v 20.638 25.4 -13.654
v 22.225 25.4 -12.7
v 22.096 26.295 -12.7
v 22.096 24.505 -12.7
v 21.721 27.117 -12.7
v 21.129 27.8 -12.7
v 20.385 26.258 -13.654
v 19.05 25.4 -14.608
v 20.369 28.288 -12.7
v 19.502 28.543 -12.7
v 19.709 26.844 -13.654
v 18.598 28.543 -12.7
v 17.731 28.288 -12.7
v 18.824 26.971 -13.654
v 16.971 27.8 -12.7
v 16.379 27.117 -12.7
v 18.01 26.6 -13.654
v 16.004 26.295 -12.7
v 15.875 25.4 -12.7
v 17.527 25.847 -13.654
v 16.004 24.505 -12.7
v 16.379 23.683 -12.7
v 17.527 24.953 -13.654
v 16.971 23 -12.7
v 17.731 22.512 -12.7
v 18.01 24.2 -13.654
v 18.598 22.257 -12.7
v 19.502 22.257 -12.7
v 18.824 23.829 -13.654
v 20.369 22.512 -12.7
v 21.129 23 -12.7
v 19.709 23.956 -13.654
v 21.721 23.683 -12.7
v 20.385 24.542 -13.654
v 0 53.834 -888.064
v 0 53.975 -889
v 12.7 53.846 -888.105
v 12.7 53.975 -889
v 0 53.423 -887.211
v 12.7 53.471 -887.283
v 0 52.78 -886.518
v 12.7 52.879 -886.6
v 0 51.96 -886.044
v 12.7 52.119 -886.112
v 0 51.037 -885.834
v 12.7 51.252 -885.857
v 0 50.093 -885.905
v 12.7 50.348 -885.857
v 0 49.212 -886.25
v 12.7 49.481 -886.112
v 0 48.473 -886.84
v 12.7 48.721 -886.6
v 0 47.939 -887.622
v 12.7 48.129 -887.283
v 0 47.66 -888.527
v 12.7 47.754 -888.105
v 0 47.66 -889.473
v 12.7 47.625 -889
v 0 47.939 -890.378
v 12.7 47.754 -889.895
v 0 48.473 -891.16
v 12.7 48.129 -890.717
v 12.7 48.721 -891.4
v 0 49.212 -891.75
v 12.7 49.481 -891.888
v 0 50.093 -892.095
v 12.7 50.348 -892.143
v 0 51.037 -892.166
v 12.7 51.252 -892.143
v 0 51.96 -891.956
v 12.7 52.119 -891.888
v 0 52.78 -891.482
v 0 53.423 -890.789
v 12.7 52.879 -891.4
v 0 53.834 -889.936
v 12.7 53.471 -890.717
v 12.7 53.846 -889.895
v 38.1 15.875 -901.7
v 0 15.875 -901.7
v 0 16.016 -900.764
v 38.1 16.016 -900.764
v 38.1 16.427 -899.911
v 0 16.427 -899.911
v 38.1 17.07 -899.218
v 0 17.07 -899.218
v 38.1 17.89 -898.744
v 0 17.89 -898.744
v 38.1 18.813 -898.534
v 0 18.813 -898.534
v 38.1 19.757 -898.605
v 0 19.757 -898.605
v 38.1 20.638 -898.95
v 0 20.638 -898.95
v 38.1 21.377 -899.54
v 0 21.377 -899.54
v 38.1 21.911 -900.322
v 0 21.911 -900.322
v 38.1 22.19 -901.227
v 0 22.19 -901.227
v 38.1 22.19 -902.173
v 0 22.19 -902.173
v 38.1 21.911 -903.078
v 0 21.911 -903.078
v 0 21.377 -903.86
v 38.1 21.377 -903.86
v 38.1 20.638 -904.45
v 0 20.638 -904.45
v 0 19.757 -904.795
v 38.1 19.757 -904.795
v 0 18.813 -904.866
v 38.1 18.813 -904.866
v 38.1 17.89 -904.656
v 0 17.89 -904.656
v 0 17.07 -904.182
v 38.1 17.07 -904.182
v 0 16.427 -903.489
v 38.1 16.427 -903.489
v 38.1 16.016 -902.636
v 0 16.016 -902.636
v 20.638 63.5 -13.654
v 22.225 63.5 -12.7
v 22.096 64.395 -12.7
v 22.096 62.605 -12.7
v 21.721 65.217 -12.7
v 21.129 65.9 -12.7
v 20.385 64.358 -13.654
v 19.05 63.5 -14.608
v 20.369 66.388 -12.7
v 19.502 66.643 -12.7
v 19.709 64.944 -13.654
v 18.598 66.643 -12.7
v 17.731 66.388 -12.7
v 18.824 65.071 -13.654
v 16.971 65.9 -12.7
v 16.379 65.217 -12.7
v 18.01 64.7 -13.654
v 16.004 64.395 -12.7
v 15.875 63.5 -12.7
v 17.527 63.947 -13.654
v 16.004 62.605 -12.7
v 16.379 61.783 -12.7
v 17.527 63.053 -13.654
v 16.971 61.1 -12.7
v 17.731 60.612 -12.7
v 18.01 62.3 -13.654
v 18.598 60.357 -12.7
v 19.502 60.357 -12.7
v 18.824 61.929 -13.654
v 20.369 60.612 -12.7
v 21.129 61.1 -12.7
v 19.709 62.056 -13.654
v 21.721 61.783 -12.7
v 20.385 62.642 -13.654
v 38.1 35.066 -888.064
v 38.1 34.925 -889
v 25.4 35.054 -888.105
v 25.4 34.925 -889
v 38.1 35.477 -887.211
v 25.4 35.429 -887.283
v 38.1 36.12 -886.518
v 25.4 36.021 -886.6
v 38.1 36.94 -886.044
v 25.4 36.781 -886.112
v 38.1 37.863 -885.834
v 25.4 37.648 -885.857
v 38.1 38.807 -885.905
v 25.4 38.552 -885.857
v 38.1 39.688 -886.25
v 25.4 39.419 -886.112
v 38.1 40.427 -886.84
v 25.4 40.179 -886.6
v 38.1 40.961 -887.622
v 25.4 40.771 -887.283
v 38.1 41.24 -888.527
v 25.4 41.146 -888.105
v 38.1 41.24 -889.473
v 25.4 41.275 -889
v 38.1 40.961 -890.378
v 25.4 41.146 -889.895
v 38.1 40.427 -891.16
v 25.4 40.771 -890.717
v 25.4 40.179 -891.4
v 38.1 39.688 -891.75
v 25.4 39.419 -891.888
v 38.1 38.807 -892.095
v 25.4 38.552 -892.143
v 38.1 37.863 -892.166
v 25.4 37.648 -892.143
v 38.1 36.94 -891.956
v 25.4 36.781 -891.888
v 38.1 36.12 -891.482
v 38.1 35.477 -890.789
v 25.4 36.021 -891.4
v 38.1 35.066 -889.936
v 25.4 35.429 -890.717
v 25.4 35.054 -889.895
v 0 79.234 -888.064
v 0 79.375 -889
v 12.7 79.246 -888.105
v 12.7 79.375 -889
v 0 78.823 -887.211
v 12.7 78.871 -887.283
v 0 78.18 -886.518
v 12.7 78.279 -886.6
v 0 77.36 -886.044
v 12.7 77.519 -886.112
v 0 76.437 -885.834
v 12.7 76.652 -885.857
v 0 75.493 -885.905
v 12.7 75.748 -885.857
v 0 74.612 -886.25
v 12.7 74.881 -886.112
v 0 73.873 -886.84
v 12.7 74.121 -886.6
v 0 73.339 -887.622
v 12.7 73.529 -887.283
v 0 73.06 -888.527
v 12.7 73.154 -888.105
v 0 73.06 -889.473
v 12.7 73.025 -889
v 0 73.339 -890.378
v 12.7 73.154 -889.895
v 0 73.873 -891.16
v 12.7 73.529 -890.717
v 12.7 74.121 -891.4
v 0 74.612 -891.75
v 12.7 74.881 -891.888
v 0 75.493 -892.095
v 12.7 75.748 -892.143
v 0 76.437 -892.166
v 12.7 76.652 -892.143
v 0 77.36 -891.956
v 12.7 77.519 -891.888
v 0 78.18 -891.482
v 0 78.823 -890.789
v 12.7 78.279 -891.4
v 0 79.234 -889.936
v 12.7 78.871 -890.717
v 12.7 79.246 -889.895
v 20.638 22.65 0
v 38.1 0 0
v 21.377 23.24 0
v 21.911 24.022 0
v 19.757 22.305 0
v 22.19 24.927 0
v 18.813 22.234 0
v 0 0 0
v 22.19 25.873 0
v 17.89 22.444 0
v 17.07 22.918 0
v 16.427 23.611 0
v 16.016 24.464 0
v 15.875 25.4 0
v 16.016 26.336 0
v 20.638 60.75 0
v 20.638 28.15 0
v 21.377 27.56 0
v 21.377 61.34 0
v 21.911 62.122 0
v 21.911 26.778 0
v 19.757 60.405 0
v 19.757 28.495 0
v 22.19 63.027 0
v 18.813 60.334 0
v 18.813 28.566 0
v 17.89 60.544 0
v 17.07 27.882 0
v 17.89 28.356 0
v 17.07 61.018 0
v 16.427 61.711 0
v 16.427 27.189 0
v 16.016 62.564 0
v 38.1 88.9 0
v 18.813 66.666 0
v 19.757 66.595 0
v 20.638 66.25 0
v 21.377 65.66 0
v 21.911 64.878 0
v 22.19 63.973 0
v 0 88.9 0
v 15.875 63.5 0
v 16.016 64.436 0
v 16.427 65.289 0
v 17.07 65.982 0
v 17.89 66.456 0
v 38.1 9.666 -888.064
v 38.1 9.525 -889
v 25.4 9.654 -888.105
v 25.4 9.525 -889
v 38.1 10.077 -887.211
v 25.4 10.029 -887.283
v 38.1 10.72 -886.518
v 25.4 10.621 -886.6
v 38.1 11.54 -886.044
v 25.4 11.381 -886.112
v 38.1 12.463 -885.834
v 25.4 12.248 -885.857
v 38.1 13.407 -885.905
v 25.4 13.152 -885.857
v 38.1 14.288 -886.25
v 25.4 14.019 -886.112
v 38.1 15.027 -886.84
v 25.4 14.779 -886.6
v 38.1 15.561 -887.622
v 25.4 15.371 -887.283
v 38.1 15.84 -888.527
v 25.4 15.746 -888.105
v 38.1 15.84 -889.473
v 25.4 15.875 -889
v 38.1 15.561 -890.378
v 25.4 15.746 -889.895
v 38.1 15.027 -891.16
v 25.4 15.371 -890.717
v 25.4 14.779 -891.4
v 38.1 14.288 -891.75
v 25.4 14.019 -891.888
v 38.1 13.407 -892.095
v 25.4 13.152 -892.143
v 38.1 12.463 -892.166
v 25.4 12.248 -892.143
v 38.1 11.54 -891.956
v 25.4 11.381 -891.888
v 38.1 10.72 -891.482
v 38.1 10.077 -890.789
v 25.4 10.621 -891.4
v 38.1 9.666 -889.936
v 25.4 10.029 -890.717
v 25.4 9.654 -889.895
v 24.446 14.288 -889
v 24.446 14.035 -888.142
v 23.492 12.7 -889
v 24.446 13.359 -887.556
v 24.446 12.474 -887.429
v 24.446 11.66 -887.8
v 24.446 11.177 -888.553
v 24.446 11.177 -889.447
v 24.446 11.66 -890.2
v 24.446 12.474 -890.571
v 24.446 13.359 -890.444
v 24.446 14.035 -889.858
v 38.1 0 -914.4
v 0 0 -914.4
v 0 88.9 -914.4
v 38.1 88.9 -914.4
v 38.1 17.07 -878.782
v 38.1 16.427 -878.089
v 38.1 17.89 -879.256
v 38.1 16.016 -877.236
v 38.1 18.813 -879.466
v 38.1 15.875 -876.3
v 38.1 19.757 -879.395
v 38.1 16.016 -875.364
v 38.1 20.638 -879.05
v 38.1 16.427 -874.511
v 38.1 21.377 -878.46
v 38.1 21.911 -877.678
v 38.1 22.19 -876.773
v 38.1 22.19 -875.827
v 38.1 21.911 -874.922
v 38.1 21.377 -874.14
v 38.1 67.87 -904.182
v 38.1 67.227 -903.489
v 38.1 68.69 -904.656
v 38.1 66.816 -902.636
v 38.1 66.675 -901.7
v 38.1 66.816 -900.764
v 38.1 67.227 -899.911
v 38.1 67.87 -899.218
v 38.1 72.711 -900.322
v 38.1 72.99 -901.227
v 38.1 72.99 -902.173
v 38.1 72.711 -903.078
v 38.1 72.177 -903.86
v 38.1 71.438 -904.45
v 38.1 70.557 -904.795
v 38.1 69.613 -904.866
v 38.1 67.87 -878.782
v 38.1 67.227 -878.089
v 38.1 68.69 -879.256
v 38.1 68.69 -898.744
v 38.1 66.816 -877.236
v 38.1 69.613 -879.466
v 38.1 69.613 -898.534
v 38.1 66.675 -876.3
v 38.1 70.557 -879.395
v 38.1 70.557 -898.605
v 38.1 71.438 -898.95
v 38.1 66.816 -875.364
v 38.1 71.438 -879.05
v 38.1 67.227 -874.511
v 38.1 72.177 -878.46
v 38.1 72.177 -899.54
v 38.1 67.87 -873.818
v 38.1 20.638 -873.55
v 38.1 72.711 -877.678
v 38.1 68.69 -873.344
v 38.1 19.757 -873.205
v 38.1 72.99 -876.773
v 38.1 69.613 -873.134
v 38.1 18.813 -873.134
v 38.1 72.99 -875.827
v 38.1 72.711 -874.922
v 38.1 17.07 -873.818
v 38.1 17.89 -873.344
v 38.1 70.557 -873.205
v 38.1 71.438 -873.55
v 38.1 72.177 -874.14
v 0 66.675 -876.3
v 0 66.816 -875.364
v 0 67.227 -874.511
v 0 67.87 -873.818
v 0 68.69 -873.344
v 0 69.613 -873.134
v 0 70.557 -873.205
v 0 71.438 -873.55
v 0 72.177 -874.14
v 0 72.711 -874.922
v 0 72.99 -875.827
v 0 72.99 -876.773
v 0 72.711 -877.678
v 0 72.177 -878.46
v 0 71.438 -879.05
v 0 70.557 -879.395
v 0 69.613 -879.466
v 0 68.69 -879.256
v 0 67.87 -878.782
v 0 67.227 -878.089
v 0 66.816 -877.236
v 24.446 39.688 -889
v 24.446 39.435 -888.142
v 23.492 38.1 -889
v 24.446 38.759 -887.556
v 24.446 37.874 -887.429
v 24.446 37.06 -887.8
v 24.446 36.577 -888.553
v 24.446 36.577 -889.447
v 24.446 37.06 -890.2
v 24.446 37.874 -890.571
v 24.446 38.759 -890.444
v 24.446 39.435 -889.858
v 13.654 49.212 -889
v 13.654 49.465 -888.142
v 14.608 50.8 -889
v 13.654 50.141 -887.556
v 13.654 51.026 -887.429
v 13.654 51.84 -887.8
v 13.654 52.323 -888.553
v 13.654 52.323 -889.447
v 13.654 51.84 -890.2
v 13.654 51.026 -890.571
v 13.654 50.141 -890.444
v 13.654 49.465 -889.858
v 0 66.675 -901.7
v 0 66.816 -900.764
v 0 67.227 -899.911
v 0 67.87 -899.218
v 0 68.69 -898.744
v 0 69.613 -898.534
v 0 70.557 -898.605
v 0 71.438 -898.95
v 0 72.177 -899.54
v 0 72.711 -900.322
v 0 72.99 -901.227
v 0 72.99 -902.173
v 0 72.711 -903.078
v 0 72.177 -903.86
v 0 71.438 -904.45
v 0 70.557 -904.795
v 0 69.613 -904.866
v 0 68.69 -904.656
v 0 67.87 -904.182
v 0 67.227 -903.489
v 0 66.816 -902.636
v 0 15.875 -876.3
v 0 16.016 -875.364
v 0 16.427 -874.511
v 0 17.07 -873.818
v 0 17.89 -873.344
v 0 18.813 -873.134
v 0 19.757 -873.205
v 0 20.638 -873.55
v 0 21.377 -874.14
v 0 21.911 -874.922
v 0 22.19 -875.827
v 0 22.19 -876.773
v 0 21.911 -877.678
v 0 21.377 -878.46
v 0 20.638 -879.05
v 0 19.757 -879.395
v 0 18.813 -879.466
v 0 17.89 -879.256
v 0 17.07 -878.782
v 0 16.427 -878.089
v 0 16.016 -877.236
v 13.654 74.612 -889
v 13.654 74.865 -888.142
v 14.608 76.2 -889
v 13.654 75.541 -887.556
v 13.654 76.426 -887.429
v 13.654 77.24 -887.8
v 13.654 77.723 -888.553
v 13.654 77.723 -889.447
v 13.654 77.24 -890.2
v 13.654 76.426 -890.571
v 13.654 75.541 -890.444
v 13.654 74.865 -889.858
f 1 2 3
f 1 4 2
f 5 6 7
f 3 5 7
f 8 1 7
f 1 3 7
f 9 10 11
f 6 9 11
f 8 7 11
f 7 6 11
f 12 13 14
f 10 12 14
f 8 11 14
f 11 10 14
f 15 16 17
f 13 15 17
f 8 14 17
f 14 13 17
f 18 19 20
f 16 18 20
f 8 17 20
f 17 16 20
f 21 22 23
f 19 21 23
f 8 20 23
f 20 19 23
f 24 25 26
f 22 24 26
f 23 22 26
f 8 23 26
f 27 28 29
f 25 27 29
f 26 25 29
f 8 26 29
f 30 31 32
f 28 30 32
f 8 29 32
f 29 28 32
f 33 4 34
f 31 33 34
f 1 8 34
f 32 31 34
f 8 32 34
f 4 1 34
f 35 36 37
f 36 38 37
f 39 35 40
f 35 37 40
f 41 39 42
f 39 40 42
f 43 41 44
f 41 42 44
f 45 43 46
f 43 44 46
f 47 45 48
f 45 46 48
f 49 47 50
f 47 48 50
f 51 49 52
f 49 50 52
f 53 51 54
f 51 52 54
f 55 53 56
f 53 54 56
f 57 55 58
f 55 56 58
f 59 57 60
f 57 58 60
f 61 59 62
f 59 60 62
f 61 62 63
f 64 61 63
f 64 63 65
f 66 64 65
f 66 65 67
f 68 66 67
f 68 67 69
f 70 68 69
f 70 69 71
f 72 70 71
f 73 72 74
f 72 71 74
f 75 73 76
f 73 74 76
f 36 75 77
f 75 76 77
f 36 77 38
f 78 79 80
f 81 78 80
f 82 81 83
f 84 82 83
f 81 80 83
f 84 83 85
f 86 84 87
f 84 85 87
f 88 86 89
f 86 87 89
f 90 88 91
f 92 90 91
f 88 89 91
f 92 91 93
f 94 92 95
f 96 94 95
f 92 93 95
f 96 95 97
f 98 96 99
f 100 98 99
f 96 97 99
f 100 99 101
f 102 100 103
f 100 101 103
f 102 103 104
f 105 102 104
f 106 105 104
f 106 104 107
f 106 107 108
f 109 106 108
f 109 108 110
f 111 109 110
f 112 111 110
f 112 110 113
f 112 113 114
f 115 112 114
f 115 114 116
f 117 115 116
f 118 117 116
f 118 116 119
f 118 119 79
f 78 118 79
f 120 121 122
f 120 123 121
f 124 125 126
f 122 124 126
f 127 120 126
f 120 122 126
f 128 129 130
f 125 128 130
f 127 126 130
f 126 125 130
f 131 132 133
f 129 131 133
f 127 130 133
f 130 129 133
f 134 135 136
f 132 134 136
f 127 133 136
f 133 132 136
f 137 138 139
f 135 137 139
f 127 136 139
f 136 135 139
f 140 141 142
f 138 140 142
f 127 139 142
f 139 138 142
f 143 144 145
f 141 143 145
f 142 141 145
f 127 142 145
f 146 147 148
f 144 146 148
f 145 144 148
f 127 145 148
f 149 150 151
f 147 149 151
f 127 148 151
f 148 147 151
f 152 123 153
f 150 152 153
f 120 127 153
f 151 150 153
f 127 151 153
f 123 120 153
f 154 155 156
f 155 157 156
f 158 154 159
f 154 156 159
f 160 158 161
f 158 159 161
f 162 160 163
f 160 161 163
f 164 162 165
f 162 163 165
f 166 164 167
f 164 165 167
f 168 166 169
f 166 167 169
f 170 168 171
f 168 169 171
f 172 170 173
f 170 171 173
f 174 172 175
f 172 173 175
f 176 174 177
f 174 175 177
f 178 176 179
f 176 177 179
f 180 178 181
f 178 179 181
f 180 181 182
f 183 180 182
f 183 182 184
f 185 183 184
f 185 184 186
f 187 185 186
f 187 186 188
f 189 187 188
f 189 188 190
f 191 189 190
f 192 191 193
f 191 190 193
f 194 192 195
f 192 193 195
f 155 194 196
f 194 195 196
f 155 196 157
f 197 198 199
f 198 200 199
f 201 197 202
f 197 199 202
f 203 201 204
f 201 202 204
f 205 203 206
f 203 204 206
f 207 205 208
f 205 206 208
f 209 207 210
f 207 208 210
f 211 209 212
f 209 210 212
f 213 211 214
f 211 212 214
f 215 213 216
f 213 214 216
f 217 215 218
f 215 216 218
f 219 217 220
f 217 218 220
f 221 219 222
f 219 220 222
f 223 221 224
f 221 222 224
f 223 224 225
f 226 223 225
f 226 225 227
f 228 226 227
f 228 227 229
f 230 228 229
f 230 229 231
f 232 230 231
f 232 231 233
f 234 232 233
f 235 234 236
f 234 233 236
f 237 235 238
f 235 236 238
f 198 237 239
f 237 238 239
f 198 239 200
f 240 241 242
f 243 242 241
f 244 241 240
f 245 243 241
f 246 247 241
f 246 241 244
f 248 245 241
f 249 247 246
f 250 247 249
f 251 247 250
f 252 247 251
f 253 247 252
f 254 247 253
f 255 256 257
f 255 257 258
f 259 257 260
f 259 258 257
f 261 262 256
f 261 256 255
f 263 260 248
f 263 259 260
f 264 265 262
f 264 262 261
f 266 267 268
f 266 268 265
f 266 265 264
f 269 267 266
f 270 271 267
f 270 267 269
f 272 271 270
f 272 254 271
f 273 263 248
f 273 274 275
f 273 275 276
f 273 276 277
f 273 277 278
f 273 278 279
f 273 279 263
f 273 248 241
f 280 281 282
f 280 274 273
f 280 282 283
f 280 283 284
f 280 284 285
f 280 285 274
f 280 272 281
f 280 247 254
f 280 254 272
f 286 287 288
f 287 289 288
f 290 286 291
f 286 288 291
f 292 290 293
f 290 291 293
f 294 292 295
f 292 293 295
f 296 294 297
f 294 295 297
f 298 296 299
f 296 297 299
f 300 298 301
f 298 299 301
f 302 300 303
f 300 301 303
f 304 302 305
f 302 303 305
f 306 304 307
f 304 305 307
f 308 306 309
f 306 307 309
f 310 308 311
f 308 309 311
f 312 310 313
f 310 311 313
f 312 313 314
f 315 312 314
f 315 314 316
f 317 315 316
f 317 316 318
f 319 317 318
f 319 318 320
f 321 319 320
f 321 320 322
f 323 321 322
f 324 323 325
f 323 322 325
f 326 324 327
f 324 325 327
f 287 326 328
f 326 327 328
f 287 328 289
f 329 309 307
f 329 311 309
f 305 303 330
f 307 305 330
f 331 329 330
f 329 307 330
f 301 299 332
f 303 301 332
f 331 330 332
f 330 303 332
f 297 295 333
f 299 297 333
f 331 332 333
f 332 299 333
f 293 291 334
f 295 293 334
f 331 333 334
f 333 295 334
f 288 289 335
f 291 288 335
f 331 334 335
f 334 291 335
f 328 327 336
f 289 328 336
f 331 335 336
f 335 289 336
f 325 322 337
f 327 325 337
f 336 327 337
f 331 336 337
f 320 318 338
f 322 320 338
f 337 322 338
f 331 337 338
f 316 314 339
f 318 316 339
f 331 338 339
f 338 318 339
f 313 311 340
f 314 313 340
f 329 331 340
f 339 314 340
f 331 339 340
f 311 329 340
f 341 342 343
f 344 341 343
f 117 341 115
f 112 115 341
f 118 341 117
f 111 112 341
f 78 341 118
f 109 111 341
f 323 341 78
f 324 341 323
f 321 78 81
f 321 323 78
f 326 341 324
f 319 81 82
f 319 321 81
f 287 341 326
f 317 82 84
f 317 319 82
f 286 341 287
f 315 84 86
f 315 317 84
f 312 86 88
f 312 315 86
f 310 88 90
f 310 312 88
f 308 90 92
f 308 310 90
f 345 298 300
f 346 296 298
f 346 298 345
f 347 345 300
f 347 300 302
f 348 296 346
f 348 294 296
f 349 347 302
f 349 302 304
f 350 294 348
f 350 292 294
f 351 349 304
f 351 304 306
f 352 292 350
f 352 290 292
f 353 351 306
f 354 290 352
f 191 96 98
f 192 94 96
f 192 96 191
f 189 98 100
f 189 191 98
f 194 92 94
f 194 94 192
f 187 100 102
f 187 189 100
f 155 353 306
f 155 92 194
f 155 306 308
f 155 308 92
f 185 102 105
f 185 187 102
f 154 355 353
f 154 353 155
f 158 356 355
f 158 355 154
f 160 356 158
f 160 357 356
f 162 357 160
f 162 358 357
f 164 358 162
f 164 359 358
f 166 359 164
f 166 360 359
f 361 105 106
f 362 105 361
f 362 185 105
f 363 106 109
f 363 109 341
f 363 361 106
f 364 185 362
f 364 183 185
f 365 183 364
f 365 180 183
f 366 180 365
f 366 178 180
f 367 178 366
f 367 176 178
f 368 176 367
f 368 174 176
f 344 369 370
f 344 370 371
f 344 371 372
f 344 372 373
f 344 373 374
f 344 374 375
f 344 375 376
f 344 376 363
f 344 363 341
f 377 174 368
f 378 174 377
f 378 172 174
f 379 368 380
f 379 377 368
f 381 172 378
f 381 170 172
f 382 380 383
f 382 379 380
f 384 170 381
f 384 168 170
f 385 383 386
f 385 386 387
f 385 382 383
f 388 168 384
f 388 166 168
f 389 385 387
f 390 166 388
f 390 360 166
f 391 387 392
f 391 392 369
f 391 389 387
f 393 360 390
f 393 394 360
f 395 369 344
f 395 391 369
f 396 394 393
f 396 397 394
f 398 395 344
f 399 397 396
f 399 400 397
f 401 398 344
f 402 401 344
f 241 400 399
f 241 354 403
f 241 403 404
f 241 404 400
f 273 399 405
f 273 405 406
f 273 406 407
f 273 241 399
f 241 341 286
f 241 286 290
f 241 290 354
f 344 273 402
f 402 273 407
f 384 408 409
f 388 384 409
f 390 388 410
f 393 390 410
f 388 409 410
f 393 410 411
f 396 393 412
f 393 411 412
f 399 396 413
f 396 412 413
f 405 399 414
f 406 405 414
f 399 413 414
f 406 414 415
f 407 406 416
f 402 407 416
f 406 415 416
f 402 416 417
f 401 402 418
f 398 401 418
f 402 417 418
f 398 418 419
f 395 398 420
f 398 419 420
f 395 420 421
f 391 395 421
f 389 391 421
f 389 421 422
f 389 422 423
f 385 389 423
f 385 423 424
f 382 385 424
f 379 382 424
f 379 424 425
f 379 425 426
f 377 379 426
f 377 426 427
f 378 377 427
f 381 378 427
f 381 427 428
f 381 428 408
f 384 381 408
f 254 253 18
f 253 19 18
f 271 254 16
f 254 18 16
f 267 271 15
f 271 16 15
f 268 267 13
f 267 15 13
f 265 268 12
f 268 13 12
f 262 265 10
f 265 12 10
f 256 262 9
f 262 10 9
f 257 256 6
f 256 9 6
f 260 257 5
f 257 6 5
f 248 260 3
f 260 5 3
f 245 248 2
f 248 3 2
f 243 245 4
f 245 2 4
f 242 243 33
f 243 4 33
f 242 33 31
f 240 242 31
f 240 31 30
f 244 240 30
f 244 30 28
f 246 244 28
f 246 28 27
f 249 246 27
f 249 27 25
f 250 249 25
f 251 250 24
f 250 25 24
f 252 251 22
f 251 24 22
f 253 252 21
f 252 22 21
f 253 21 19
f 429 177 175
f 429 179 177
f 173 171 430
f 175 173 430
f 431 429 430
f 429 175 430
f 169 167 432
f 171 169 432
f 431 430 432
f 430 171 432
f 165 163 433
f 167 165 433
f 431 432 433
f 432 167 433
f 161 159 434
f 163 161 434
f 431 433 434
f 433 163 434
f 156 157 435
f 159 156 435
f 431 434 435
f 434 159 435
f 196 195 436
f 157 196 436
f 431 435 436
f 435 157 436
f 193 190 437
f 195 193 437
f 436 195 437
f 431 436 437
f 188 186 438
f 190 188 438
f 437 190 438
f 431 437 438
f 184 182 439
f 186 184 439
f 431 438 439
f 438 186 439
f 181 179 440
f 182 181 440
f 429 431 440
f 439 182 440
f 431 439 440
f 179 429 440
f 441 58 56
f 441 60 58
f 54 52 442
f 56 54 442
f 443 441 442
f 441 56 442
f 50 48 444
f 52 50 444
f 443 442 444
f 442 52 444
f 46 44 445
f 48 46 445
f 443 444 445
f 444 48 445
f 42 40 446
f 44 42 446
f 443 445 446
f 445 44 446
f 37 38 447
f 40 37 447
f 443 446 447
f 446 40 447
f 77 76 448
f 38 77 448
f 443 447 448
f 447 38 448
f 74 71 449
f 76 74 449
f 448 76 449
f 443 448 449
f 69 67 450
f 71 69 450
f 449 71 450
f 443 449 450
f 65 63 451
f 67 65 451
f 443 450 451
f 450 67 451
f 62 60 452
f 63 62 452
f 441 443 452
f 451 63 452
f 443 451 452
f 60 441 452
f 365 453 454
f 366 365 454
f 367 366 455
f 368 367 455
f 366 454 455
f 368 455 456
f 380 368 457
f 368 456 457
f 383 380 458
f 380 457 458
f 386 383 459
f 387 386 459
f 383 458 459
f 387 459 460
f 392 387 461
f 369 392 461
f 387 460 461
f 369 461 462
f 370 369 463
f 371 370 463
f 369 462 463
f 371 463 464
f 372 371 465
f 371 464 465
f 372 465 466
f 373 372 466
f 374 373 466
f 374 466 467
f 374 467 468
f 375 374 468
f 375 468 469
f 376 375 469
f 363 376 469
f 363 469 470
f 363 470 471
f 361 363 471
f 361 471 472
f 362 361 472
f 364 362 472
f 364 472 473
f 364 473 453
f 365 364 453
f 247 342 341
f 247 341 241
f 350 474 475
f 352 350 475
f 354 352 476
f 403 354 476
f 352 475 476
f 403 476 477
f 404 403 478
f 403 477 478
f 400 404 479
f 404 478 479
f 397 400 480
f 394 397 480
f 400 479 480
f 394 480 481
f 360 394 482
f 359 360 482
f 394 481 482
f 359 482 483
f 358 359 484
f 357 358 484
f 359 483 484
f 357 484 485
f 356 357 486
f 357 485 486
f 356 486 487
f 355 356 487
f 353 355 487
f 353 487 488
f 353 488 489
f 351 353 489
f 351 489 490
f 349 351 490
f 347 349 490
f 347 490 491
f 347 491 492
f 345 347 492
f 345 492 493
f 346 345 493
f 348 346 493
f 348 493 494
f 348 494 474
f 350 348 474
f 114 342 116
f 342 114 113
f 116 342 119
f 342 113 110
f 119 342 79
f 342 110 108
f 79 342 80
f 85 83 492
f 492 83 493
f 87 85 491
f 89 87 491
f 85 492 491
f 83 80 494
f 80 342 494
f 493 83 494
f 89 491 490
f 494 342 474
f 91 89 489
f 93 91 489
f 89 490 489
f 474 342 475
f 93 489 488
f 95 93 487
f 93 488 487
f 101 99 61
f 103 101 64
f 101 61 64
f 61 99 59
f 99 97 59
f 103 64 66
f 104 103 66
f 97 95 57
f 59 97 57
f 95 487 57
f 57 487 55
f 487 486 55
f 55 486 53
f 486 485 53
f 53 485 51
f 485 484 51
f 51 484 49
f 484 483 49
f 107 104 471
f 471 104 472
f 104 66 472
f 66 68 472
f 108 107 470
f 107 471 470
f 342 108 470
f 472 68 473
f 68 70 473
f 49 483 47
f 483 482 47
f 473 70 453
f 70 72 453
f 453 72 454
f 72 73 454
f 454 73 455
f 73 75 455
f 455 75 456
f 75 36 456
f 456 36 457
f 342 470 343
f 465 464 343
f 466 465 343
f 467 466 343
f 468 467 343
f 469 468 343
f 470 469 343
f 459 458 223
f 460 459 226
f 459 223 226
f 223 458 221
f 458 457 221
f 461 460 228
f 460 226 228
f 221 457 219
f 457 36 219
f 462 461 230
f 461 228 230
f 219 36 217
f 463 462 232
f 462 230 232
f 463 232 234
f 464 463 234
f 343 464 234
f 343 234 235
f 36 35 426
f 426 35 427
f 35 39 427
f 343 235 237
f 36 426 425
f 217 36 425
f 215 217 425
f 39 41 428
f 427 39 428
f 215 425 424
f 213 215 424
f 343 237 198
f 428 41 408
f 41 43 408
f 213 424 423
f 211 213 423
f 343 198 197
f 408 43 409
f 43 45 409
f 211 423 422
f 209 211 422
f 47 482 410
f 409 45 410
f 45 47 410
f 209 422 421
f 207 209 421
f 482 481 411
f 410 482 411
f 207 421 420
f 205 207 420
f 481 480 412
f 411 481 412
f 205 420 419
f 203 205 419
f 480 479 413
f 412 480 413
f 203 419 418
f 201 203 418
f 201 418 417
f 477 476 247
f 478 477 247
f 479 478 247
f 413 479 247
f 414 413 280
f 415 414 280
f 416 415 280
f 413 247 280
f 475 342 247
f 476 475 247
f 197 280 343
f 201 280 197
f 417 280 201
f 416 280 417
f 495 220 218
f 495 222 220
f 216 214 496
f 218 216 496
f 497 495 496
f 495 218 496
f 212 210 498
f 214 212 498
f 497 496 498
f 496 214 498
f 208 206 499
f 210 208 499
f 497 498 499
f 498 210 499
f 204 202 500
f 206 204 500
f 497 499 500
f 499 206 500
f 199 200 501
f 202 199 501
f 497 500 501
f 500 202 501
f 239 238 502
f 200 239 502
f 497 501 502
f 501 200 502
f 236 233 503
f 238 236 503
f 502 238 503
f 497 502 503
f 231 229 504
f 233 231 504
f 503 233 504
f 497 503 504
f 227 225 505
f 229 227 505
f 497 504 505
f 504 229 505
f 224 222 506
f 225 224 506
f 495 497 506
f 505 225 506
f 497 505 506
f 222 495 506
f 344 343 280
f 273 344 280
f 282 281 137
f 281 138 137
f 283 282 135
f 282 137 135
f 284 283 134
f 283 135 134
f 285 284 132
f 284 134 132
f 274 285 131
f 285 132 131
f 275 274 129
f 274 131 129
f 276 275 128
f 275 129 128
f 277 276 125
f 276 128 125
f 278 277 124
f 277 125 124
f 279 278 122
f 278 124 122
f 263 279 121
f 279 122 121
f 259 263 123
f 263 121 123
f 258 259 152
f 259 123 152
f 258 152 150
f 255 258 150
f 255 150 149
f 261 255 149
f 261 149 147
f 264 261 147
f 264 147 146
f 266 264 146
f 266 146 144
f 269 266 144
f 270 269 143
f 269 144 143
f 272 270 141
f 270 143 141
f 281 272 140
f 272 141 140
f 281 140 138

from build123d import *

# Parameters (mm, degrees)
F0_W     = 88.9
F0_H     = 914.4
F1_DEPTH = 38.1
F3_D     = 6.35
F5_D     = 6.35
F5_DEPTH = 12.7
F5_TIP   = 1.9077324654
F7_D     = 6.35
F7_DEPTH = 12.7
F7_TIP   = 1.9077324654
F9_D     = 6.35
F9_DEPTH = 12.7
F9_TIP   = 1.9077324654


with BuildPart() as f1:
    # F0 (on Right) → F1 (new body)
    with BuildSketch(Plane.YZ):
        with Locations((44.45, -457.2)):
            Rectangle(F0_W, F0_H)
    extrude(amount=F1_DEPTH)

    # F3 (through all)
    with Locations(Plane.YZ.offset(38.1)):
        with Locations((19.05, -876.3), (19.05, -901.7), (69.85, -876.3), (69.85, -901.7)):
            Hole(F3_D / 2)

    # F5
    with Locations(Plane(origin=(0, 0, 0), x_dir=(0, -1, 0), z_dir=(-1, 0, 0))):
        with Locations((-76.2, -889), (-50.8, -889)):
            Hole(F5_D / 2, depth=F5_DEPTH)
            with Locations((0, 0, -(F5_DEPTH + F5_TIP / 2))):  # 118° drill point
                Cone(0, F5_D / 2, F5_TIP, mode=Mode.SUBTRACT)

    # F7
    with Locations(Plane.YZ.offset(38.1)):
        with Locations((12.7, -889), (38.1, -889)):
            Hole(F7_D / 2, depth=F7_DEPTH)
            with Locations((0, 0, -(F7_DEPTH + F7_TIP / 2))):  # 118° drill point
                Cone(0, F7_D / 2, F7_TIP, mode=Mode.SUBTRACT)

    # F9
    with Locations(Plane.XY):
        with Locations((19.05, 63.5), (19.05, 25.4)):
            Hole(F9_D / 2, depth=F9_DEPTH)
            with Locations((0, 0, -(F9_DEPTH + F9_TIP / 2))):  # 118° drill point
                Cone(0, F9_D / 2, F9_TIP, mode=Mode.SUBTRACT)


solid = f1.part
